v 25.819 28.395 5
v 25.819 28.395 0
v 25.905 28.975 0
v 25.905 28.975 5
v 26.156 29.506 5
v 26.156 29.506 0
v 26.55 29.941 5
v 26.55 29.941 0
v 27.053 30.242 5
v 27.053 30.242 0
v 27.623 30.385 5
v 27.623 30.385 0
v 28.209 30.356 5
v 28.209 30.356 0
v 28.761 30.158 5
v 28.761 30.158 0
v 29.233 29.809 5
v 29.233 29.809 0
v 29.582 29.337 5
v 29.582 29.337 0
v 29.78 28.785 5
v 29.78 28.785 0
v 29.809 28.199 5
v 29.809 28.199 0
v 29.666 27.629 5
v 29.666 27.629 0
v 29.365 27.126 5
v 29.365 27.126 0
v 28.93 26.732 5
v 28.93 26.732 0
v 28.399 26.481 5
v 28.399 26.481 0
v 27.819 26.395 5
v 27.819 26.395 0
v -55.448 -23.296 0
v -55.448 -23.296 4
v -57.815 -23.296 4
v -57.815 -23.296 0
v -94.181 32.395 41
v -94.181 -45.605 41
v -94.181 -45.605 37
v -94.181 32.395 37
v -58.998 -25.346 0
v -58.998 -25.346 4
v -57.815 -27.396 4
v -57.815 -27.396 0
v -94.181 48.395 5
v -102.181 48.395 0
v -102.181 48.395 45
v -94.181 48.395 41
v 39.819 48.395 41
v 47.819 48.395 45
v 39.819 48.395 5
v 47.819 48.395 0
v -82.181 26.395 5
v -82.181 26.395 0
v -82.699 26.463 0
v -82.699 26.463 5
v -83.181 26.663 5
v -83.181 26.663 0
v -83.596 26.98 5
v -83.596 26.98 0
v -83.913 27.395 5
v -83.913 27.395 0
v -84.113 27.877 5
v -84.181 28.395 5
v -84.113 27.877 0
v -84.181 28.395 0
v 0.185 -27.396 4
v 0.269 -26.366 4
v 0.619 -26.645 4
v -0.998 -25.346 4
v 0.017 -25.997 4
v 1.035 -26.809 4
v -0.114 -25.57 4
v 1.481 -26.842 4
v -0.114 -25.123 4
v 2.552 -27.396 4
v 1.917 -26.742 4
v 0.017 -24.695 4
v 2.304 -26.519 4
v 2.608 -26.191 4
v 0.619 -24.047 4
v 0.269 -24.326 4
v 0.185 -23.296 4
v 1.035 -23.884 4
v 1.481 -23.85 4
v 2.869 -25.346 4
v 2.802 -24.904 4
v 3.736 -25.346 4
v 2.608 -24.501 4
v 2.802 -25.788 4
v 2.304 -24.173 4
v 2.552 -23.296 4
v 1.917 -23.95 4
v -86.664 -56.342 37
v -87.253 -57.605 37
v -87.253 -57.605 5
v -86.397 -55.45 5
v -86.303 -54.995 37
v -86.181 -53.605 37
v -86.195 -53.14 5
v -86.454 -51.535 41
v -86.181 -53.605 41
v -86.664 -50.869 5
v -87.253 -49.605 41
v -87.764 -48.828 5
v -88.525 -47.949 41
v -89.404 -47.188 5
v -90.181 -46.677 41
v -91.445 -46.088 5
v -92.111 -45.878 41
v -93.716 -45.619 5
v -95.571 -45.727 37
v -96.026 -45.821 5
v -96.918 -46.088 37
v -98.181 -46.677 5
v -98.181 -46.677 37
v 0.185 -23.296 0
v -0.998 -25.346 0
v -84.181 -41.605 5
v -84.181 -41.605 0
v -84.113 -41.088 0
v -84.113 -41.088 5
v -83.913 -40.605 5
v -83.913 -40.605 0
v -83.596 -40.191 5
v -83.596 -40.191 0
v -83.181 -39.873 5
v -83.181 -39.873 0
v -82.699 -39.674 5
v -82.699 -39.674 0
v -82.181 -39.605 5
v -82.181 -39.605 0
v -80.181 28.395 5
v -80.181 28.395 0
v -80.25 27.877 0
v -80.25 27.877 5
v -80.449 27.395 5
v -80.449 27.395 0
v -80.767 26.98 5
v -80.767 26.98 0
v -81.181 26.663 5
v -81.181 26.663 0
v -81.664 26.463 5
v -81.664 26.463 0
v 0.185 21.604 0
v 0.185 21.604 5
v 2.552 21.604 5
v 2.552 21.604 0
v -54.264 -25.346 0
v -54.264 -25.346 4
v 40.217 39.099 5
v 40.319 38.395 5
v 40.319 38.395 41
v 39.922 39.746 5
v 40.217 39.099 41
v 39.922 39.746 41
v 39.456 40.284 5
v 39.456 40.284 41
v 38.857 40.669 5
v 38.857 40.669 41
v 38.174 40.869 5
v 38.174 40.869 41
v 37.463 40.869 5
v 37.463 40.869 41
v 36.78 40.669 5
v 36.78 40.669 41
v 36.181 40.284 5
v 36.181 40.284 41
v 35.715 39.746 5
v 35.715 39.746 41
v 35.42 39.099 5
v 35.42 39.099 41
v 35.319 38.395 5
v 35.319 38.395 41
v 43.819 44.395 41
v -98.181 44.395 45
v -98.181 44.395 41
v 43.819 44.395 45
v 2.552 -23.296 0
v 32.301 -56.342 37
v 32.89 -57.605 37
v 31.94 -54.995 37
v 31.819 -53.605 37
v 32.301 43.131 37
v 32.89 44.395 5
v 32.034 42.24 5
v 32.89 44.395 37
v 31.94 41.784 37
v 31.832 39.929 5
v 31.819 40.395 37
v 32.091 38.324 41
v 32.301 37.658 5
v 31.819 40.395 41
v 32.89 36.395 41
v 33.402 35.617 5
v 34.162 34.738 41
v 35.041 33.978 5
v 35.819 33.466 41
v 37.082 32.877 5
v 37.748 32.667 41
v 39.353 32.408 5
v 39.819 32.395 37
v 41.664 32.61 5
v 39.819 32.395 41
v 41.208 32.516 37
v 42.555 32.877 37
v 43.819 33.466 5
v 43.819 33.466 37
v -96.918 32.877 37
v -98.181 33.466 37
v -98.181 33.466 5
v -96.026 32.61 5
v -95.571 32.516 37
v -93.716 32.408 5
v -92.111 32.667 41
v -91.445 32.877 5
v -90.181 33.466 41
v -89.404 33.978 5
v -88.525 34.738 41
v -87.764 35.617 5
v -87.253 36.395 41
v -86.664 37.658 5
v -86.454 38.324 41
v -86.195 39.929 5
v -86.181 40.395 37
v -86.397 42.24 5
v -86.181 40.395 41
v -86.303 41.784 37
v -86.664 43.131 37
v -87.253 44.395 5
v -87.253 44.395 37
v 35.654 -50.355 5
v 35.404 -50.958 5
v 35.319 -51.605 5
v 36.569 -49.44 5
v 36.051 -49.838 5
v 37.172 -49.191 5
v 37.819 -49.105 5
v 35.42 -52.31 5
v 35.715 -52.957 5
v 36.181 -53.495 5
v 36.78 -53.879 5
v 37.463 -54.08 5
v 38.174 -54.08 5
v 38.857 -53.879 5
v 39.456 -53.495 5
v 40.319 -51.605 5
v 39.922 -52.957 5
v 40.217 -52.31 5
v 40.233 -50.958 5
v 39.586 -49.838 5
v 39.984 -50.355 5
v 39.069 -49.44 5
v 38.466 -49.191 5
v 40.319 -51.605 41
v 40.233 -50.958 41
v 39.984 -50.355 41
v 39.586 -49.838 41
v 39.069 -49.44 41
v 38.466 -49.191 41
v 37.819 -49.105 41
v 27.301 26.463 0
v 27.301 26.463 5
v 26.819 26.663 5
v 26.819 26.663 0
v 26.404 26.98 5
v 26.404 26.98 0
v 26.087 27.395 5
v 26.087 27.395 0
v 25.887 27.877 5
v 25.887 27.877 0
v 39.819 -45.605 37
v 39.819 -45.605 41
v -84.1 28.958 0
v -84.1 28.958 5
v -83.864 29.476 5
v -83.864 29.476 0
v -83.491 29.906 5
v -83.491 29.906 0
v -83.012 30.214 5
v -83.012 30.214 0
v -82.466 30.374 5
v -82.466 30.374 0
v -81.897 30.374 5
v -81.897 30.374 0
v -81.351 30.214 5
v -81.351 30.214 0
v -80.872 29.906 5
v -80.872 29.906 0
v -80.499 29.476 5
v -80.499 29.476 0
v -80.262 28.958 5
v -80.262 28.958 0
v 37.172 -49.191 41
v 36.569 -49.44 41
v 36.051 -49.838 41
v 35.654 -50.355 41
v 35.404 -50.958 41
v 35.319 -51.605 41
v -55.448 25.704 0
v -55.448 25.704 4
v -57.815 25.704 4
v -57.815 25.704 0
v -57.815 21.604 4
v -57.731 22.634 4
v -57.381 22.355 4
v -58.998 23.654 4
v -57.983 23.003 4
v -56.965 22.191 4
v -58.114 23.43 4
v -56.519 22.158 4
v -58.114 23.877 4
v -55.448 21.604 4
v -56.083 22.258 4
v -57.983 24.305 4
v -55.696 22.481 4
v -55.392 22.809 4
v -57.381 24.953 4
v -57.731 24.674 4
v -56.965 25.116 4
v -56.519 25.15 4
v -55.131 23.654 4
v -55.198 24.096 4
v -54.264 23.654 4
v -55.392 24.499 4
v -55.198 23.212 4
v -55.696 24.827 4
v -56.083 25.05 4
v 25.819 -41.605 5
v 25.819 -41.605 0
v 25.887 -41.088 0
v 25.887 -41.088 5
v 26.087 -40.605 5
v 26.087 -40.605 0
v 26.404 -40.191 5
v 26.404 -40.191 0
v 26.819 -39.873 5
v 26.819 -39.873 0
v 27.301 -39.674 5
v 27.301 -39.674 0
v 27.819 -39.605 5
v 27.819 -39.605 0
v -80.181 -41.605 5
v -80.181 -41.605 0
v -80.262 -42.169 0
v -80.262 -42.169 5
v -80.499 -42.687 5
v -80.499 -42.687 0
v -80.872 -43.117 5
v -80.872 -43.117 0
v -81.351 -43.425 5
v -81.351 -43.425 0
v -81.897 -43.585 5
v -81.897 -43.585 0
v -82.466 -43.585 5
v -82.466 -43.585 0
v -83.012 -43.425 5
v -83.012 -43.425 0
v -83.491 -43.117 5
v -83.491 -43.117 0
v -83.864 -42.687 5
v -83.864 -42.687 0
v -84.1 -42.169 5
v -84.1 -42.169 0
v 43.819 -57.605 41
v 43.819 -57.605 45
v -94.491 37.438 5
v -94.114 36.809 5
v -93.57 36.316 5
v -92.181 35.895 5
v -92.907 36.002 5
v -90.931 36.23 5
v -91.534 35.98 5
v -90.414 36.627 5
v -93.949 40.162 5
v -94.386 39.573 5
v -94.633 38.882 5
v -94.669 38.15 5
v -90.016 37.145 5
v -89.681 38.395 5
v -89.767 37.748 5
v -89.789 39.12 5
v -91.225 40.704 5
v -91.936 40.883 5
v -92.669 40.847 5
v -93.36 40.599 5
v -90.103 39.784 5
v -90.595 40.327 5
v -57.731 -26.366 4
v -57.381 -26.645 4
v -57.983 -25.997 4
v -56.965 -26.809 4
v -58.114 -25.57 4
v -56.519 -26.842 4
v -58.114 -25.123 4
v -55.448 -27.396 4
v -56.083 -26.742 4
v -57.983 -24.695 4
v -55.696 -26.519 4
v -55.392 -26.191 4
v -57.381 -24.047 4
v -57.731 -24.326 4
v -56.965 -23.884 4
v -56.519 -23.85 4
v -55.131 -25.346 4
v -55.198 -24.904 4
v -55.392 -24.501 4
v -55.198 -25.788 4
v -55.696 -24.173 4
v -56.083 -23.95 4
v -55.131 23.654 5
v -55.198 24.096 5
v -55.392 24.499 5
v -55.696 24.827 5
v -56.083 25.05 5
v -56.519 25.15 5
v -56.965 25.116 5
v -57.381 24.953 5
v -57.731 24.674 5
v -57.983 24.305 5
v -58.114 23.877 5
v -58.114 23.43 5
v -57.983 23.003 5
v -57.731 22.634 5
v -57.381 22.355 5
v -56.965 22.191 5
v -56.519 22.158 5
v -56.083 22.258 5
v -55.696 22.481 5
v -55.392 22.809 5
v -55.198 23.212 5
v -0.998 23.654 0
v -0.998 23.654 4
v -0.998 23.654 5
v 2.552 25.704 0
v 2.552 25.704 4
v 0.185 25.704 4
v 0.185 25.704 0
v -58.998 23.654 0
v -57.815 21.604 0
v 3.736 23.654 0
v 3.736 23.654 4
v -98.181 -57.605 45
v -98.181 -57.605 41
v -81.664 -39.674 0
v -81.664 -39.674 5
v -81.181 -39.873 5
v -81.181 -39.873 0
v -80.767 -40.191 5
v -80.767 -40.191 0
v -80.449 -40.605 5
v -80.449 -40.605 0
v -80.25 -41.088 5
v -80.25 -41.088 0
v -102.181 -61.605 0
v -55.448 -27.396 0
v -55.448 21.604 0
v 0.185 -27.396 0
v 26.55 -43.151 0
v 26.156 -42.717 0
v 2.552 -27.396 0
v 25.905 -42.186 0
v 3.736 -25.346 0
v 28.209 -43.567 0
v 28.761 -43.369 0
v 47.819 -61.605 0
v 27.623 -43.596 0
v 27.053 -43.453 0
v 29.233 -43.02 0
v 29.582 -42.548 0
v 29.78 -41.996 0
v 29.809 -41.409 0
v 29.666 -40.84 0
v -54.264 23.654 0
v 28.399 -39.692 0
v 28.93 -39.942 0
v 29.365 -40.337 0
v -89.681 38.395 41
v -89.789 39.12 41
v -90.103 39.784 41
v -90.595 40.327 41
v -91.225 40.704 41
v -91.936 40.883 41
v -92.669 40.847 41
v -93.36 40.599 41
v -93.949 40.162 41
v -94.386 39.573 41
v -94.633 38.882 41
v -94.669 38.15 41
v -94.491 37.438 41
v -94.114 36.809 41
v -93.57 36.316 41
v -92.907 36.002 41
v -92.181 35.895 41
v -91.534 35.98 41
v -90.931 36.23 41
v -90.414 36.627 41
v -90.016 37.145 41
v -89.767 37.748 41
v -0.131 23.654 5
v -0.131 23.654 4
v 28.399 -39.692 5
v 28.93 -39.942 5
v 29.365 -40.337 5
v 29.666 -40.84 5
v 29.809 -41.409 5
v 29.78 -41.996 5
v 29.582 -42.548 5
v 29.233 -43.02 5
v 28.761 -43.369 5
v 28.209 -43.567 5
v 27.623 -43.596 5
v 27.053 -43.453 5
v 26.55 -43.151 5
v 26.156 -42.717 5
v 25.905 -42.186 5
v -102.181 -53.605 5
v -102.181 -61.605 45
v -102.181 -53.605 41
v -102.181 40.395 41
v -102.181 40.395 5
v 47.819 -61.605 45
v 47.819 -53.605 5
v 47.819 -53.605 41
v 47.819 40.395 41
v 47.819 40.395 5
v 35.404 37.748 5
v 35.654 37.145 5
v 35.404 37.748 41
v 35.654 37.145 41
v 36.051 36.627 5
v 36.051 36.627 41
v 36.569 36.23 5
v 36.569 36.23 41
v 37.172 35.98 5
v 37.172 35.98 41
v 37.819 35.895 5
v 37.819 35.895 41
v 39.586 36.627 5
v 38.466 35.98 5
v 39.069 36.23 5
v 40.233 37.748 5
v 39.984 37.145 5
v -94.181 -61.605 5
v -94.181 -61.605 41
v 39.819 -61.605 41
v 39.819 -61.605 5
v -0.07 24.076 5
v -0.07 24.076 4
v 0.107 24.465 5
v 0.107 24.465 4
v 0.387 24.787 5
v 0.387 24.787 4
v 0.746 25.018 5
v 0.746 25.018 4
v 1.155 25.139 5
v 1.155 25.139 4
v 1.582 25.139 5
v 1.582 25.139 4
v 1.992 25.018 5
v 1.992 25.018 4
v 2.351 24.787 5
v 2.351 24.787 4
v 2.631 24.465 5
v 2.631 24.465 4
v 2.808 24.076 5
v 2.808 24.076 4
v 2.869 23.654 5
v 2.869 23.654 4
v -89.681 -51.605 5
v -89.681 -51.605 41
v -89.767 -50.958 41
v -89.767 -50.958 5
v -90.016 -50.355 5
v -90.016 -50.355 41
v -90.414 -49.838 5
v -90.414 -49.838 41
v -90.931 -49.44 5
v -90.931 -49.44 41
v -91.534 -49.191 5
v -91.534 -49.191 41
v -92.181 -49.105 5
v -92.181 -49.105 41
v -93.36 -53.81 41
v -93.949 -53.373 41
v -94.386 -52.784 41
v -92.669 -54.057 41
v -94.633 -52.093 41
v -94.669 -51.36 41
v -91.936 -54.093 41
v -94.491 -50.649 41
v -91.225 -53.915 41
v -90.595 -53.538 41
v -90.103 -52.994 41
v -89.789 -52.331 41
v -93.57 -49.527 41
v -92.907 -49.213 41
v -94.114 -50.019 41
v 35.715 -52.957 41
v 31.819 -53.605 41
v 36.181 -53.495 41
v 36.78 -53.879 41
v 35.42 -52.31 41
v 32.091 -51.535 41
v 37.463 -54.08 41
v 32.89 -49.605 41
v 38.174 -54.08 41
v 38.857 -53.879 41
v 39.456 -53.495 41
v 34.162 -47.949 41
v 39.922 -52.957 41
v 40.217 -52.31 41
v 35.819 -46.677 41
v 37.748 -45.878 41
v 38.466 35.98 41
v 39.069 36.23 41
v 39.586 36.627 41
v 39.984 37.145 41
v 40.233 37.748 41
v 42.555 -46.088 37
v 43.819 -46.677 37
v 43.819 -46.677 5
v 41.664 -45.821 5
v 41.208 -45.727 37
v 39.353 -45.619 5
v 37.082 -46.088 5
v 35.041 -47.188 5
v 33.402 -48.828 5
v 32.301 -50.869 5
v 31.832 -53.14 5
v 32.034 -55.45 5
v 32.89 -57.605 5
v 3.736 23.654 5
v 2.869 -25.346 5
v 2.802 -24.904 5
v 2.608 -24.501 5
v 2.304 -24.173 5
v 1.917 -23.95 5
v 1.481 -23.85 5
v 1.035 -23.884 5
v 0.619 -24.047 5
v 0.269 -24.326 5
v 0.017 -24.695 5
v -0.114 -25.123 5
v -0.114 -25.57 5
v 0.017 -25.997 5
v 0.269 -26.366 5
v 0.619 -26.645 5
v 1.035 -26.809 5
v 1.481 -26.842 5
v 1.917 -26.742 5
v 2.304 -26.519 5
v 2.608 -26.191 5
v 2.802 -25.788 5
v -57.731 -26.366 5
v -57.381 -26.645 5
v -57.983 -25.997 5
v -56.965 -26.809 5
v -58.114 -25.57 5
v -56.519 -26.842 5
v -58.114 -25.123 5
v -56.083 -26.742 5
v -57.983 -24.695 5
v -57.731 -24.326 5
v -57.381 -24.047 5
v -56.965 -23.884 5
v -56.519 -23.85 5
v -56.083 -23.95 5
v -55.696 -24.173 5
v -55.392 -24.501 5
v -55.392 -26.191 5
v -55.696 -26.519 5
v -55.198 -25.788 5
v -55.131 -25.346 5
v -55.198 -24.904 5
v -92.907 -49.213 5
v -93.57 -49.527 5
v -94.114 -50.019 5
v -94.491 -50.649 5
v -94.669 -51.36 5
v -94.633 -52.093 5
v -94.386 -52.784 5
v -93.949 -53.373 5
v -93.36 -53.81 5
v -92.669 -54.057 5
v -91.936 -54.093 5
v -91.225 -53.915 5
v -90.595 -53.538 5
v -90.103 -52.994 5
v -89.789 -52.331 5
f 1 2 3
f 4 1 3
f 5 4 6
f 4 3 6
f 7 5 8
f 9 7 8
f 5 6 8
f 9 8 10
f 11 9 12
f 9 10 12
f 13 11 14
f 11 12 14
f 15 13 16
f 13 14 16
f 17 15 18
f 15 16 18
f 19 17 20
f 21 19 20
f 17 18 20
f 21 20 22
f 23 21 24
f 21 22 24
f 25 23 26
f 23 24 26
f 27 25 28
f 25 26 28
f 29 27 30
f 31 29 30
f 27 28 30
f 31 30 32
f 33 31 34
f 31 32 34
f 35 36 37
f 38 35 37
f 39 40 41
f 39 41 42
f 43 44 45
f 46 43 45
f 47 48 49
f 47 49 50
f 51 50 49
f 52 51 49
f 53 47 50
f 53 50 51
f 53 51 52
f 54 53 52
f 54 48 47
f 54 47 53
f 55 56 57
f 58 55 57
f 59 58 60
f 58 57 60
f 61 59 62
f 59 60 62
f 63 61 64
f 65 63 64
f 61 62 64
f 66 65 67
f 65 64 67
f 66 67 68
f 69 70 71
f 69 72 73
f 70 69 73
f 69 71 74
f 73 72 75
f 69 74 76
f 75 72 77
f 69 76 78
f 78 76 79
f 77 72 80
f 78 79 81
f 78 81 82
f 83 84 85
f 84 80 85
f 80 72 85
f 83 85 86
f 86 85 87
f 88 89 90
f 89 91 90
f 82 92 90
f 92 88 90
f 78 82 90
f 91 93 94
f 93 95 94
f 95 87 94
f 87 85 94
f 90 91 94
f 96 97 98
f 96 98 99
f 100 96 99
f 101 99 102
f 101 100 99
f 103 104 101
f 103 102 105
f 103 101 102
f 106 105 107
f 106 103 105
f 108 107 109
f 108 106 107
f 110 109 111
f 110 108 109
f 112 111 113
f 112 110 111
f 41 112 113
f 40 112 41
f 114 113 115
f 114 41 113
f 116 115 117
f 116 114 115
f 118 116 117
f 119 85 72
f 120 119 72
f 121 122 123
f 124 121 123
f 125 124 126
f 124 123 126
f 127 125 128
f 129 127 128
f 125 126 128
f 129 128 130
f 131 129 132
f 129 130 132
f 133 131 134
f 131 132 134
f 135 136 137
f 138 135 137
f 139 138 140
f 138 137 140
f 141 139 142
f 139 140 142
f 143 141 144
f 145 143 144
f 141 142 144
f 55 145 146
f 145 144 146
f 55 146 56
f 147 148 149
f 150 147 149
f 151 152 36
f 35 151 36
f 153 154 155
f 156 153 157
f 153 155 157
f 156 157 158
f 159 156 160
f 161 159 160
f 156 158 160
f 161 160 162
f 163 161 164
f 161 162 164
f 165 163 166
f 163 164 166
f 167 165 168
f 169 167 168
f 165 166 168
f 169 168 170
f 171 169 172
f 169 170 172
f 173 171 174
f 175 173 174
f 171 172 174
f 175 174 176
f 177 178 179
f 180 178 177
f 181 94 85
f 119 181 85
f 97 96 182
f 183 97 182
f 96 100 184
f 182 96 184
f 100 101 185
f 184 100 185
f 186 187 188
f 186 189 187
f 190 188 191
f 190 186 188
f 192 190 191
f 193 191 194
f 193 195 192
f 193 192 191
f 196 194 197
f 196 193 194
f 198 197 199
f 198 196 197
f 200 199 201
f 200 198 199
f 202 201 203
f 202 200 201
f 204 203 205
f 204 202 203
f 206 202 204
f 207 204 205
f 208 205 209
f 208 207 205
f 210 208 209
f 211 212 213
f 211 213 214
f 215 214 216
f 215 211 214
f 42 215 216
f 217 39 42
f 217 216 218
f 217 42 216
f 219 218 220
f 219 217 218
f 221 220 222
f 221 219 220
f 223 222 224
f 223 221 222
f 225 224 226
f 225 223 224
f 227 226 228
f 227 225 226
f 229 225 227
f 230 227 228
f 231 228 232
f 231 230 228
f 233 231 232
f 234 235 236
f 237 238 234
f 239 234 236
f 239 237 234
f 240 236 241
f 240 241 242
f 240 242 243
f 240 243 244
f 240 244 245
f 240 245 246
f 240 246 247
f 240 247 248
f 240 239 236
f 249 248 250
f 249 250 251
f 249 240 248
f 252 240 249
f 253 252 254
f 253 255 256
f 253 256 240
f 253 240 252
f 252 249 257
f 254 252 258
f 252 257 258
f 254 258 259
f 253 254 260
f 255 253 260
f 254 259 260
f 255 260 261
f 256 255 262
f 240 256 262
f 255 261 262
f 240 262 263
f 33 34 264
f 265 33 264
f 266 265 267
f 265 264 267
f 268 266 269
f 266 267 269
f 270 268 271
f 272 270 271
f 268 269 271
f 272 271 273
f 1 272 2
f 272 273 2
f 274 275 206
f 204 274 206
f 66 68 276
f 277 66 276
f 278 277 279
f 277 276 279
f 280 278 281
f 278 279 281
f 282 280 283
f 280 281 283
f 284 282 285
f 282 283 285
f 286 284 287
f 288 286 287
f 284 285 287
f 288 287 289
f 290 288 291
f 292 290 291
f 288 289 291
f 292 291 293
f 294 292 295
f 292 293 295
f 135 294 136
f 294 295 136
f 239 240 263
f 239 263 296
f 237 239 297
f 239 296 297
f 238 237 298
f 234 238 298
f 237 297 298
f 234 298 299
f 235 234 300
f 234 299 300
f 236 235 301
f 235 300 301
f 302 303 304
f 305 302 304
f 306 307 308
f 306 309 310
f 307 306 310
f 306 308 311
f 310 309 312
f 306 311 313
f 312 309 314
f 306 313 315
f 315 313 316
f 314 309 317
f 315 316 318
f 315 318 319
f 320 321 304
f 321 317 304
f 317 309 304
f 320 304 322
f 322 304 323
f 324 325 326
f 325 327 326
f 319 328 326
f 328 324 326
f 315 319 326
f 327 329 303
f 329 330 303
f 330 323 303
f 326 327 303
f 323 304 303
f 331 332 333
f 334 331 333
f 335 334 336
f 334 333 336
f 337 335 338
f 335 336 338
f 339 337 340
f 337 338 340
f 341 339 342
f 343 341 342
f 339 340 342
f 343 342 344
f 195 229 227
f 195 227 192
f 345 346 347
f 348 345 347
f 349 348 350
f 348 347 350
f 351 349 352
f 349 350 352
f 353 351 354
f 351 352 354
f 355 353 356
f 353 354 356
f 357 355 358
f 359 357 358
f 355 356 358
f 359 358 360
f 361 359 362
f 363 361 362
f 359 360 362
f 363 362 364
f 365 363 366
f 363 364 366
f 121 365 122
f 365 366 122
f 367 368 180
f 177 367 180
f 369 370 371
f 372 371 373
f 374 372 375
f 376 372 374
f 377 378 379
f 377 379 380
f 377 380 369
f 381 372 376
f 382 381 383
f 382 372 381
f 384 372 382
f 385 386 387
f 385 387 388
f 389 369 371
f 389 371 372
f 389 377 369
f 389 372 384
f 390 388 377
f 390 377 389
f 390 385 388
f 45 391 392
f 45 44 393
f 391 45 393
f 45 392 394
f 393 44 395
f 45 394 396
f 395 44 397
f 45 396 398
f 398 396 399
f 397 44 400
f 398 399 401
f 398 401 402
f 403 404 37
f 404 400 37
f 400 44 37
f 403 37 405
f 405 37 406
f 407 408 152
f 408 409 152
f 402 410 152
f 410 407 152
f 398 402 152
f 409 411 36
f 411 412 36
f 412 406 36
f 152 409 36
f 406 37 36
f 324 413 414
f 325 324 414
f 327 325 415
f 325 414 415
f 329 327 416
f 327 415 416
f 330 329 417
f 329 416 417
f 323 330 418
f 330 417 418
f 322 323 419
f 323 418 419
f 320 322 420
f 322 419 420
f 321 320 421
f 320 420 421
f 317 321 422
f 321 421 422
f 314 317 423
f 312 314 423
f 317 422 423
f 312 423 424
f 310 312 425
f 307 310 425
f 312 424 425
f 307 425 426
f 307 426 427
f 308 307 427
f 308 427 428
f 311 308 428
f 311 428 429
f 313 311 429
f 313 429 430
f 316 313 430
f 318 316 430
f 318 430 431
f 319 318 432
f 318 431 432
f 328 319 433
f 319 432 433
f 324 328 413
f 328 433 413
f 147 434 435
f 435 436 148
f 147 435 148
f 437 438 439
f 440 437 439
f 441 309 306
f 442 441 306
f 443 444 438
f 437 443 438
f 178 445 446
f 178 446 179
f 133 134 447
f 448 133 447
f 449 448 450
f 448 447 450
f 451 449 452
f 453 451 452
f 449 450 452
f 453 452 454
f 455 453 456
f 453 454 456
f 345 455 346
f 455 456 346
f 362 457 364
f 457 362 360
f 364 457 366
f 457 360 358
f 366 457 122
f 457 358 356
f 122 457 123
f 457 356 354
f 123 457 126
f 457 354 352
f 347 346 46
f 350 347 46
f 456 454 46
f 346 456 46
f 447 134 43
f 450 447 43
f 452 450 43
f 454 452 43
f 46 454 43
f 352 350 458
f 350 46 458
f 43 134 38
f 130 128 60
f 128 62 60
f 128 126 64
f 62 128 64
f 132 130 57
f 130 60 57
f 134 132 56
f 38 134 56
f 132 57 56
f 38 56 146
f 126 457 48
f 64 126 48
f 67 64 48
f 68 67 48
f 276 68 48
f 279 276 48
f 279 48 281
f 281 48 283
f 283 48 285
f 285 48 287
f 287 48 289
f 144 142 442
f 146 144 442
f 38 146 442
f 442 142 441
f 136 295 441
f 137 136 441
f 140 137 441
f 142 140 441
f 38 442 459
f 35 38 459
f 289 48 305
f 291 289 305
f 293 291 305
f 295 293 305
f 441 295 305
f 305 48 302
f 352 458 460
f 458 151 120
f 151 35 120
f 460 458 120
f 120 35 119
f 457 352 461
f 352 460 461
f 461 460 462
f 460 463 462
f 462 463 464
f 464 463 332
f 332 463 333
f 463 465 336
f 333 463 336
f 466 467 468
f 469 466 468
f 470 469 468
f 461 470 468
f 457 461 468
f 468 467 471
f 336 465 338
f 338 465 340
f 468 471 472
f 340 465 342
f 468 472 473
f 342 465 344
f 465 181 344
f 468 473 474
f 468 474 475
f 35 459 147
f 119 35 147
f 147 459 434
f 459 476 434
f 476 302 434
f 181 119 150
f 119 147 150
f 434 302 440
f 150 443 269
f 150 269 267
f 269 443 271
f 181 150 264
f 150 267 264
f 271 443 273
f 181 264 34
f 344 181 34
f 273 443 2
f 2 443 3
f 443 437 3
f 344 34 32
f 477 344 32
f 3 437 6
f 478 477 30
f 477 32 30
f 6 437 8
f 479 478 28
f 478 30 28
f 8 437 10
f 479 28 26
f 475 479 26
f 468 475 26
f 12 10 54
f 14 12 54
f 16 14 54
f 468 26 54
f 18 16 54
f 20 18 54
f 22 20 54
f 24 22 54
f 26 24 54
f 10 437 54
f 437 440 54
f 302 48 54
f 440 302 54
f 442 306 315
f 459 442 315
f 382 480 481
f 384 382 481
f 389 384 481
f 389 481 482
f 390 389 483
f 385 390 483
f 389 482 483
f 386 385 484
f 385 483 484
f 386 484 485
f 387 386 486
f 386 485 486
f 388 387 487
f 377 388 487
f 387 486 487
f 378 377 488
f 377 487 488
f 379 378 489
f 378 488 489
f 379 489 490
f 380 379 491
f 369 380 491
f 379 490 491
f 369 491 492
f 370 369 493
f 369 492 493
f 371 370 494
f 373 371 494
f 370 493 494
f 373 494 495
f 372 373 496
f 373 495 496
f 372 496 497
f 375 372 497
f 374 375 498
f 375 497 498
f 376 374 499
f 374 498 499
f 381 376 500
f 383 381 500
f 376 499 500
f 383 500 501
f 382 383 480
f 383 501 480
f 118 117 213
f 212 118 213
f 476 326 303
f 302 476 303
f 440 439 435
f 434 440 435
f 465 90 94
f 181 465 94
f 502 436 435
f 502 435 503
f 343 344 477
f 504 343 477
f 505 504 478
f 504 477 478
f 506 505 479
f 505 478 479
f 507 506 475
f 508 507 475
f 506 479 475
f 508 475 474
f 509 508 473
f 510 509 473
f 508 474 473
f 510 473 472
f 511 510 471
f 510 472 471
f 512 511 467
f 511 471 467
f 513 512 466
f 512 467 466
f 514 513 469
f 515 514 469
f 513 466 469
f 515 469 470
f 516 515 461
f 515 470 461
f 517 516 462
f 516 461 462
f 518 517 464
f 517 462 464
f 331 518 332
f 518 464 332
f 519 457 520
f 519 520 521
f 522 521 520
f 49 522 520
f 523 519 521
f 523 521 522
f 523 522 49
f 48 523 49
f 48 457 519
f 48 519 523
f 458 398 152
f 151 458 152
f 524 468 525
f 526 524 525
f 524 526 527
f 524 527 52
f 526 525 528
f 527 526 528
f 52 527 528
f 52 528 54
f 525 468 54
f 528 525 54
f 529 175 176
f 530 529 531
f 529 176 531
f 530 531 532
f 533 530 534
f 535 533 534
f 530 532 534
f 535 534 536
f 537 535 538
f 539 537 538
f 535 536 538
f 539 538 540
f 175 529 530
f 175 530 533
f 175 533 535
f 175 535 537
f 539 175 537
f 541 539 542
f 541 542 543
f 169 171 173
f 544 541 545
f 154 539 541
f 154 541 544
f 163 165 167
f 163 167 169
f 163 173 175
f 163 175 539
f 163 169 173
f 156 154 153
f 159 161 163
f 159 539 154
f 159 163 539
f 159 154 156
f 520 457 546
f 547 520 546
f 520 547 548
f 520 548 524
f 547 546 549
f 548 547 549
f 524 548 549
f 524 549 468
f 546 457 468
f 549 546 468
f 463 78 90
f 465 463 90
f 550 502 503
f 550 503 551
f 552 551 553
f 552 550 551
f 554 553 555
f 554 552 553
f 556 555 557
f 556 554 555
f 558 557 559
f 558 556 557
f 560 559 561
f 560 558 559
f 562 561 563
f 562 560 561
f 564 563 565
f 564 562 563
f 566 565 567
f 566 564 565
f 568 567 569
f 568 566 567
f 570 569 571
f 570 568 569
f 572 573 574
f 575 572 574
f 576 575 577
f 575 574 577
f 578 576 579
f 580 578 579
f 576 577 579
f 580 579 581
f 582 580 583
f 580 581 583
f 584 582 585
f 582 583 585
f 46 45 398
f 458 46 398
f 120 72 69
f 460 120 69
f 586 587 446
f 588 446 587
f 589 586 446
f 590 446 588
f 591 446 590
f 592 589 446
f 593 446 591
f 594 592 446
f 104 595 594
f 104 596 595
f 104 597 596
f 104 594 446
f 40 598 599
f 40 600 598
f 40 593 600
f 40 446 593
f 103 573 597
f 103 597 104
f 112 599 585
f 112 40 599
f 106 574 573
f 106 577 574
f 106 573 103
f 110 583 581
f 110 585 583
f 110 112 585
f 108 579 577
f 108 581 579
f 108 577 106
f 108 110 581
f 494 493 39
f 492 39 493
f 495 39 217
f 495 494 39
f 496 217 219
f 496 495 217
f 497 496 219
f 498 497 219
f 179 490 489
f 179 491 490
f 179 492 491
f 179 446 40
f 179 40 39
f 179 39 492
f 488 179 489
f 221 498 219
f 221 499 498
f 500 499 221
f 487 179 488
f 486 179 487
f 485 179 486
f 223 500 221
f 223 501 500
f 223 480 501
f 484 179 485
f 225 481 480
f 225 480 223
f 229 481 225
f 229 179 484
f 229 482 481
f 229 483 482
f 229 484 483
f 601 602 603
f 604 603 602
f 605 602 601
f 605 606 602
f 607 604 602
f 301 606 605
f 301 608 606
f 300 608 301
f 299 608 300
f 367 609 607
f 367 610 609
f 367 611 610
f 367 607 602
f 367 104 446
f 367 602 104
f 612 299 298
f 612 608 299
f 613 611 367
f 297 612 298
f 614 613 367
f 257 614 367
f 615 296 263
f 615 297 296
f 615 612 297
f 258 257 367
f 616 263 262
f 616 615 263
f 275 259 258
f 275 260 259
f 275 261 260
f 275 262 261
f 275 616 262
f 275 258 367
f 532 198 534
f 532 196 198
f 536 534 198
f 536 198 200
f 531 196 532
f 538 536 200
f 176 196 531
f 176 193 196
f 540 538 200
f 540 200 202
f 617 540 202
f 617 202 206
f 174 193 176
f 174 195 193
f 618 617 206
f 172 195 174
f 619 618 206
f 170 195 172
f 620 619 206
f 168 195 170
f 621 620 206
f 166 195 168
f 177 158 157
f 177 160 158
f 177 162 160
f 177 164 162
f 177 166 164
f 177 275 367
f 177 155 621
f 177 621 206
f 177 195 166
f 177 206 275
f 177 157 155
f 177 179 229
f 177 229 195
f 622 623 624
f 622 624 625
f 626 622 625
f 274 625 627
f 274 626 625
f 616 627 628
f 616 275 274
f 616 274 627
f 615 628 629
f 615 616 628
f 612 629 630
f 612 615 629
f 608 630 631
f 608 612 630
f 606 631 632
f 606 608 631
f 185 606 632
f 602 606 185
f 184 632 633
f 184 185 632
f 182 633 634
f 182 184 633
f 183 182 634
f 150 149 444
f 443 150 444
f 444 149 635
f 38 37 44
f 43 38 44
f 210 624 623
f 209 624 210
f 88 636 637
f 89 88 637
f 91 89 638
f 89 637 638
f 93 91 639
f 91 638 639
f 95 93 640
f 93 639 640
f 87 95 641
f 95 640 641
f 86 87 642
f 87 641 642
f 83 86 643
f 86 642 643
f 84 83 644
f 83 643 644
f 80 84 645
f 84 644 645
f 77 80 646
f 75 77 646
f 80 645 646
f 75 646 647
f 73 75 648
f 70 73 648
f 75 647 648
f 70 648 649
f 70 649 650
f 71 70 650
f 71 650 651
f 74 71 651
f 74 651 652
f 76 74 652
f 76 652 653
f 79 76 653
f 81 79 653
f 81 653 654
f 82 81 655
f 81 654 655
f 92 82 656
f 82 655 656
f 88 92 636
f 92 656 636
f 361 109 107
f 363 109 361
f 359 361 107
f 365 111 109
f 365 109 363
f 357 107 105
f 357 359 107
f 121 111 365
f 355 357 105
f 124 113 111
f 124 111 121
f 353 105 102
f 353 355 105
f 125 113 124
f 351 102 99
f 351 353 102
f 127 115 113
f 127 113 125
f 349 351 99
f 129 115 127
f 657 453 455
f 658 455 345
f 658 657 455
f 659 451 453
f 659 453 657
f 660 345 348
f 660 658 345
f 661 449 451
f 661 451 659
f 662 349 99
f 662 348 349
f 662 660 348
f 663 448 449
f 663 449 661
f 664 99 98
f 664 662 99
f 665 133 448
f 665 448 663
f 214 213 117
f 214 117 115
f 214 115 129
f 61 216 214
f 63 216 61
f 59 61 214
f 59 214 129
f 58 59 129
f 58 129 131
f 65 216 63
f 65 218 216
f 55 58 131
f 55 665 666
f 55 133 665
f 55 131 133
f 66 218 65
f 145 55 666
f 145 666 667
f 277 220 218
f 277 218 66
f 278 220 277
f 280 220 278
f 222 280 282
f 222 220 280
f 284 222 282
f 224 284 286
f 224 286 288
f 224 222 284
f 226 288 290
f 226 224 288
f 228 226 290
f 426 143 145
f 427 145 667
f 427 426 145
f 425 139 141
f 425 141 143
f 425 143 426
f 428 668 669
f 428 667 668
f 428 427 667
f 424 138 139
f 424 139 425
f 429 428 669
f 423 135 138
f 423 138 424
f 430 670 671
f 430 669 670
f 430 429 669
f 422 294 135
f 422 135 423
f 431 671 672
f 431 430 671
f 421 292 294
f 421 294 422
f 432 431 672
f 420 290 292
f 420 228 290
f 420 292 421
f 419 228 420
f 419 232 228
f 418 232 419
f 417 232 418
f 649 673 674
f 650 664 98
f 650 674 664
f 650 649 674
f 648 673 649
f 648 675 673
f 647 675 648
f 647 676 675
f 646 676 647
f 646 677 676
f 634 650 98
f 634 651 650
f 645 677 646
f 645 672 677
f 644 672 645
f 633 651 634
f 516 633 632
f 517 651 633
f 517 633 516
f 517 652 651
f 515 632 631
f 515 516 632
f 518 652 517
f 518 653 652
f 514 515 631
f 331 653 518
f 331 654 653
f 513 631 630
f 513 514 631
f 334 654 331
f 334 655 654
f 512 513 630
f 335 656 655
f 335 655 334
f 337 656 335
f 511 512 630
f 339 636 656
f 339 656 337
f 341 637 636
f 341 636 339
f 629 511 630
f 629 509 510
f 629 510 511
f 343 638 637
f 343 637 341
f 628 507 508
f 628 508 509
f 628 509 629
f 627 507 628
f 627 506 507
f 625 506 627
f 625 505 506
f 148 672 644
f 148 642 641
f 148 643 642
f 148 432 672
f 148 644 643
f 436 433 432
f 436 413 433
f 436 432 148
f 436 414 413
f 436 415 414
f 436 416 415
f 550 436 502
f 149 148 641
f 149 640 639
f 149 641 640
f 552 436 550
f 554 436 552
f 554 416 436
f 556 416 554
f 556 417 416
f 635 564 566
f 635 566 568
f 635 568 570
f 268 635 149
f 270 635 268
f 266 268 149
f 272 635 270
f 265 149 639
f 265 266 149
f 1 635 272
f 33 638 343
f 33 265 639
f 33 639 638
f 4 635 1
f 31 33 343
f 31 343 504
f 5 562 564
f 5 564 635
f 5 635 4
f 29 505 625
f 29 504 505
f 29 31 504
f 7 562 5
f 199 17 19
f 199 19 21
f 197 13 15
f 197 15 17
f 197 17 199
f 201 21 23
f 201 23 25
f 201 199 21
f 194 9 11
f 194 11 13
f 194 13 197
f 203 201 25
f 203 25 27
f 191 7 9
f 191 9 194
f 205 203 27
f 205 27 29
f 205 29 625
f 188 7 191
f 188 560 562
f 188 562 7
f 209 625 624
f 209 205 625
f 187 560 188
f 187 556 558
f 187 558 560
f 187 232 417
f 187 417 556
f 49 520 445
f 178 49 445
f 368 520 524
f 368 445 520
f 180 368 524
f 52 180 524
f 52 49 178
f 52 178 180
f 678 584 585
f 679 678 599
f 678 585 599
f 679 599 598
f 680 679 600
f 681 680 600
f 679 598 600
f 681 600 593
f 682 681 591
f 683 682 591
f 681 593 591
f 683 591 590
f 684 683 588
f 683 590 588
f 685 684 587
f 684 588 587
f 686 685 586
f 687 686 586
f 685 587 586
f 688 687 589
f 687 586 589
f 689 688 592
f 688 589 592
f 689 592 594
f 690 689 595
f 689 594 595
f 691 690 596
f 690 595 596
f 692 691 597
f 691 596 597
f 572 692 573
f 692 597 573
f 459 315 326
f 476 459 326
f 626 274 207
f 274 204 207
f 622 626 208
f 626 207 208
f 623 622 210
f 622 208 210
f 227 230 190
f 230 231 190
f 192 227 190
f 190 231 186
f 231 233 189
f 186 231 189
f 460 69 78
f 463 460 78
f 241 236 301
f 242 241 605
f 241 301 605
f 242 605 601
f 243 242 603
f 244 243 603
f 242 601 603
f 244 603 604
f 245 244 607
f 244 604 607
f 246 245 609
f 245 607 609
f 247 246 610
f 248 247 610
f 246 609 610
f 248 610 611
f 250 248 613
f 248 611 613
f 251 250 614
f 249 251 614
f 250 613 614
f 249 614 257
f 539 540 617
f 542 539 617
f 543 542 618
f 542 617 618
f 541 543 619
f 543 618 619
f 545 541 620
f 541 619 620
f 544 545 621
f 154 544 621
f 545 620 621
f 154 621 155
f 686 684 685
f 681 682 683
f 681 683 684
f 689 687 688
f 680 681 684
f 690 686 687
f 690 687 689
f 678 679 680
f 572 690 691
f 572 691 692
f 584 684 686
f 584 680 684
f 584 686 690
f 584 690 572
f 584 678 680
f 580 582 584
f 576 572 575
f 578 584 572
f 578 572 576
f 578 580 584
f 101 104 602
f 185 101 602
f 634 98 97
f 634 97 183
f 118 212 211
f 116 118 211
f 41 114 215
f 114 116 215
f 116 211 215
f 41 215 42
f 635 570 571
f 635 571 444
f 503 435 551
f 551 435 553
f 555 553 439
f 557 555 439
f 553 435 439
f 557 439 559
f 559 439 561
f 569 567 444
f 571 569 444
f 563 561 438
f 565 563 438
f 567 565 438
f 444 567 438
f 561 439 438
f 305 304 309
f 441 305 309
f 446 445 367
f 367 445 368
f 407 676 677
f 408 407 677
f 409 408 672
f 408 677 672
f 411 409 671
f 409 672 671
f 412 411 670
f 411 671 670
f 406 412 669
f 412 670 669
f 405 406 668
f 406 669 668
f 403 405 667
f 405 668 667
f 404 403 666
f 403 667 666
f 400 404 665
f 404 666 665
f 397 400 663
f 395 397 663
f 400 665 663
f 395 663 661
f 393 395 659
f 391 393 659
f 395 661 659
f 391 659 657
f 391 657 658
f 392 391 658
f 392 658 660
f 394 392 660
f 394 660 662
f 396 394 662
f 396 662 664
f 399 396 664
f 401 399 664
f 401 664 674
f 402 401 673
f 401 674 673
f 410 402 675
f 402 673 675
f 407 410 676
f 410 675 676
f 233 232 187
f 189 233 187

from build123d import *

# Parameters (mm, degrees)
SKETCH1_W           = 150
SKETCH1_H           = 110
BOSS_EXTRUDE1_DEPTH = 5
SKETCH4_W           = 150
SKETCH4_H           = 110
SKETCH4_W_2         = 142
SKETCH4_H_2         = 102
BOSS_EXTRUDE2_DEPTH = 40
CUT_EXTRUDE1_DEPTH  = 6
SKETCH5_W           = 142
SKETCH5_H           = 102
SKETCH5_W_2         = 134
SKETCH5_H_2         = 94
BOSS_EXTRUDE3_DEPTH = 8
SKETCH6_W           = 142
SKETCH6_H           = 102
SKETCH6_W_2         = 134
SKETCH6_H_2         = 94
CUT_EXTRUDE2_DEPTH  = 4
SKETCH7_R           = 8
BOSS_EXTRUDE4_DEPTH = 36
CUT_EXTRUDE3_DEPTH  = 36
CUT_EXTRUDE4_DEPTH  = 46
SKETCH10_R          = 1.5
BOSS_EXTRUDE5_DEPTH = 1


with BuildPart() as part:
    # Sketch1 → Boss-Extrude1 (new body)
    with BuildSketch(Plane.XY):
        with Locations((-27.181372549, -6.605392157)):
            Rectangle(SKETCH1_W, SKETCH1_H)
    extrude(amount=BOSS_EXTRUDE1_DEPTH)

    # Sketch4 → Boss-Extrude2 (add)
    with BuildSketch(Plane.XY.offset(5)):
        with Locations((-27.181372549, -6.605392157)):
            Rectangle(SKETCH4_W, SKETCH4_H)
        with Locations((-27.181372549, -6.605392157)):
            Rectangle(SKETCH4_W_2, SKETCH4_H_2, mode=Mode.SUBTRACT)
    extrude(amount=BOSS_EXTRUDE2_DEPTH)

    # Sketch2 → Cut-Extrude1 (cut, through all)
    with BuildSketch(Plane(origin=(0, 0, 5), x_dir=(-1, 0, 0), z_dir=(0, 0, 1))):
        Polygon((0.998328299, 25.346145297), (-0.185239753, 27.396145297), (-2.552375857, 27.396145297), (-3.735943908, 25.346145297), (-2.552375857, 23.296145297), (-0.185239753, 23.296145297), align=None)
        Polygon((55.447624143, 27.396145297), (54.264056092, 25.346145297), (55.447624143, 23.296145297), (57.814760247, 23.296145297), (58.998328299, 25.346145297), (57.814760247, 27.396145297), align=None)
        Polygon((-0.185239753, -21.603854703), (-2.552375857, -21.603854703), (-3.735943908, -23.653854703), (-2.552375857, -25.703854703), (-0.185239753, -25.703854703), (0.998328299, -23.653854703), align=None)
        Polygon((55.447624143, -21.603854703), (54.264056092, -23.653854703), (55.447624143, -25.703854703), (57.814760247, -25.703854703), (58.998328299, -23.653854703), (57.814760247, -21.603854703), align=None)
    extrude(amount=-CUT_EXTRUDE1_DEPTH, mode=Mode.SUBTRACT)

    # Sketch5 → Boss-Extrude3 (add)
    with BuildSketch(Plane.XY.offset(45)):
        with Locations((-27.181372549, -6.605392157)):
            Rectangle(SKETCH5_W, SKETCH5_H)
        with Locations((-27.181372549, -6.605392157)):
            Rectangle(SKETCH5_W_2, SKETCH5_H_2, mode=Mode.SUBTRACT)
    extrude(amount=-BOSS_EXTRUDE3_DEPTH)

    # Sketch6 → Cut-Extrude2 (cut)
    with BuildSketch(Plane.XY.offset(45)):
        with Locations((-27.181372549, -6.605392157)):
            Rectangle(SKETCH6_W, SKETCH6_H)
        with Locations((-27.181372549, -6.605392157)):
            Rectangle(SKETCH6_W_2, SKETCH6_H_2, mode=Mode.SUBTRACT)
    extrude(amount=-CUT_EXTRUDE2_DEPTH, mode=Mode.SUBTRACT)

    # Sketch7 → Boss-Extrude4 (add)
    with BuildSketch(Plane.XY.offset(41)):
        with Locations((-94.181372549, 40.394607843)):
            Circle(SKETCH7_R)
        with Locations((-94.181372549, -53.605392157)):
            Circle(SKETCH7_R)
        with Locations((39.818627451, -53.605392157)):
            Circle(SKETCH7_R)
        with Locations((39.818627451, 40.394607843)):
            Circle(SKETCH7_R)
    extrude(amount=-BOSS_EXTRUDE4_DEPTH)

    # Sketch8 → Cut-Extrude3 (cut)
    with BuildSketch(Plane.XY.offset(41)):
        with BuildLine():
            Line((-92.181372549, 35.894607843), (-92.181372549, 38.394607843))
            Line((-92.181372549, 38.394607843), (-89.681372549, 38.394607843))
            ThreePointArc((-89.681372549, 38.394607843), (-93.949139502, 40.162374796), (-92.181372549, 35.894607843))
        make_face()
        with BuildLine():
            Line((-89.681372549, 38.394607843), (-92.181372549, 38.394607843))
            Line((-92.181372549, 38.394607843), (-92.181372549, 35.894607843))
            ThreePointArc((-92.181372549, 35.894607843), (-90.413605596, 36.62684089), (-89.681372549, 38.394607843))
        make_face()
        with BuildLine():
            ThreePointArc((40.318627451, 38.394607843), (37.818627451, 40.894607843), (35.318627451, 38.394607843))
            Line((35.318627451, 38.394607843), (37.818627451, 38.394607843))
            Line((37.818627451, 38.394607843), (37.818627451, 35.894607843))
            ThreePointArc((37.818627451, 35.894607843), (39.586394404, 36.62684089), (40.318627451, 38.394607843))
        make_face()
        with BuildLine():
            Line((37.818627451, 38.394607843), (35.318627451, 38.394607843))
            ThreePointArc((35.318627451, 38.394607843), (36.050860498, 36.62684089), (37.818627451, 35.894607843))
            Line((37.818627451, 35.894607843), (37.818627451, 38.394607843))
        make_face()
        with BuildLine():
            ThreePointArc((40.318627451, -51.605392157), (39.586394404, -49.837625204), (37.818627451, -49.105392157))
            Line((37.818627451, -49.105392157), (37.818627451, -51.605392157))
            Line((37.818627451, -51.605392157), (35.318627451, -51.605392157))
            ThreePointArc((35.318627451, -51.605392157), (37.818627451, -54.105392157), (40.318627451, -51.605392157))
        make_face()
        with BuildLine():
            Line((37.818627451, -51.605392157), (37.818627451, -49.105392157))
            ThreePointArc((37.818627451, -49.105392157), (36.050860498, -49.837625204), (35.318627451, -51.605392157))
            Line((35.318627451, -51.605392157), (37.818627451, -51.605392157))
        make_face()
        with BuildLine():
            ThreePointArc((-89.681372549, -51.605392157), (-90.413605596, -49.837625204), (-92.181372549, -49.105392157))
            Line((-92.181372549, -49.105392157), (-92.181372549, -51.605392157))
            Line((-92.181372549, -51.605392157), (-89.681372549, -51.605392157))
        make_face()
        with BuildLine():
            Line((-92.181372549, -51.605392157), (-92.181372549, -49.105392157))
            ThreePointArc((-92.181372549, -49.105392157), (-93.949139502, -53.37315911), (-89.681372549, -51.605392157))
            Line((-89.681372549, -51.605392157), (-92.181372549, -51.605392157))
        make_face()
    extrude(amount=-CUT_EXTRUDE3_DEPTH, mode=Mode.SUBTRACT)

    # Sketch9 → Cut-Extrude4 (cut, through all)
    with BuildSketch(Plane(origin=(0, 0, 0), x_dir=(-1, 0, 0), z_dir=(0, 0, -1))):
        with BuildLine():
            Line((-27.818627451, 26.394607843), (-27.818627451, 28.394607843))
            Line((-27.818627451, 28.394607843), (-25.818627451, 28.394607843))
            ThreePointArc((-25.818627451, 28.394607843), (-29.232841013, 29.808821406), (-27.818627451, 26.394607843))
        make_face()
        with BuildLine():
            Line((-25.818627451, 28.394607843), (-27.818627451, 28.394607843))
            Line((-27.818627451, 28.394607843), (-27.818627451, 26.394607843))
            ThreePointArc((-27.818627451, 26.394607843), (-26.404413889, 26.980394281), (-25.818627451, 28.394607843))
        make_face()
        with BuildLine():
            ThreePointArc((-25.818627451, -41.605392157), (-26.404413889, -40.191178594), (-27.818627451, -39.605392157))
            Line((-27.818627451, -39.605392157), (-27.818627451, -41.605392157))
            Line((-27.818627451, -41.605392157), (-25.818627451, -41.605392157))
        make_face()
        with BuildLine():
            Line((-27.818627451, -41.605392157), (-27.818627451, -39.605392157))
            ThreePointArc((-27.818627451, -39.605392157), (-29.232841013, -43.019605719), (-25.818627451, -41.605392157))
            Line((-25.818627451, -41.605392157), (-27.818627451, -41.605392157))
        make_face()
        with BuildLine():
            ThreePointArc((84.181372549, -41.605392157), (83.595586111, -40.191178594), (82.181372549, -39.605392157))
            Line((82.181372549, -39.605392157), (82.181372549, -41.605392157))
            Line((82.181372549, -41.605392157), (80.181372549, -41.605392157))
            ThreePointArc((80.181372549, -41.605392157), (82.181372549, -43.605392157), (84.181372549, -41.605392157))
        make_face()
        with BuildLine():
            Line((82.181372549, -41.605392157), (82.181372549, -39.605392157))
            ThreePointArc((82.181372549, -39.605392157), (80.767158987, -40.191178594), (80.181372549, -41.605392157))
            Line((80.181372549, -41.605392157), (82.181372549, -41.605392157))
        make_face()
        with BuildLine():
            ThreePointArc((84.181372549, 28.394607843), (82.181372549, 30.394607843), (80.181372549, 28.394607843))
            Line((80.181372549, 28.394607843), (82.181372549, 28.394607843))
            Line((82.181372549, 28.394607843), (82.181372549, 26.394607843))
            ThreePointArc((82.181372549, 26.394607843), (83.595586111, 26.980394281), (84.181372549, 28.394607843))
        make_face()
        with BuildLine():
            Line((82.181372549, 28.394607843), (80.181372549, 28.394607843))
            ThreePointArc((80.181372549, 28.394607843), (80.767158987, 26.980394281), (82.181372549, 26.394607843))
            Line((82.181372549, 26.394607843), (82.181372549, 28.394607843))
        make_face()
    extrude(amount=-CUT_EXTRUDE4_DEPTH, mode=Mode.SUBTRACT)

    # Sketch10 → Boss-Extrude5 (add)
    with BuildSketch(Plane.XY.offset(5)):
        with BuildLine():
            ThreePointArc((-0.131192195, 23.653854703), (1.368807805, 25.153854703), (2.868807805, 23.653854703))
            Line((2.868807805, 23.653854703), (3.735943908, 23.653854703))
            Line((3.735943908, 23.653854703), (2.552375857, 25.703854703))
            Line((2.552375857, 25.703854703), (0.185239753, 25.703854703))
            Line((0.185239753, 25.703854703), (-0.998328299, 23.653854703))
            Line((-0.998328299, 23.653854703), (-0.131192195, 23.653854703))
        make_face()
        Polygon((-54.264056092, 23.653854703), (-55.447624143, 25.703854703), (-57.814760247, 25.703854703), (-58.998328299, 23.653854703), (-57.814760247, 21.603854703), (-55.447624143, 21.603854703), align=None)
        with Locations((-56.631192195, 23.653854703)):
            Circle(SKETCH10_R, mode=Mode.SUBTRACT)
        Polygon((-54.264056092, -25.346145297), (-55.447624143, -23.296145297), (-57.814760247, -23.296145297), (-58.998328299, -25.346145297), (-57.814760247, -27.396145297), (-55.447624143, -27.396145297), align=None)
        with Locations((-56.631192195, -25.346145297)):
            Circle(SKETCH10_R, mode=Mode.SUBTRACT)
        Polygon((3.735943908, -25.346145297), (2.552375857, -23.296145297), (0.185239753, -23.296145297), (-0.998328299, -25.346145297), (0.185239753, -27.396145297), (2.552375857, -27.396145297), align=None)
        with Locations((1.368807805, -25.346145297)):
            Circle(SKETCH10_R, mode=Mode.SUBTRACT)
    extrude(amount=-BOSS_EXTRUDE5_DEPTH)


solid = part.part
